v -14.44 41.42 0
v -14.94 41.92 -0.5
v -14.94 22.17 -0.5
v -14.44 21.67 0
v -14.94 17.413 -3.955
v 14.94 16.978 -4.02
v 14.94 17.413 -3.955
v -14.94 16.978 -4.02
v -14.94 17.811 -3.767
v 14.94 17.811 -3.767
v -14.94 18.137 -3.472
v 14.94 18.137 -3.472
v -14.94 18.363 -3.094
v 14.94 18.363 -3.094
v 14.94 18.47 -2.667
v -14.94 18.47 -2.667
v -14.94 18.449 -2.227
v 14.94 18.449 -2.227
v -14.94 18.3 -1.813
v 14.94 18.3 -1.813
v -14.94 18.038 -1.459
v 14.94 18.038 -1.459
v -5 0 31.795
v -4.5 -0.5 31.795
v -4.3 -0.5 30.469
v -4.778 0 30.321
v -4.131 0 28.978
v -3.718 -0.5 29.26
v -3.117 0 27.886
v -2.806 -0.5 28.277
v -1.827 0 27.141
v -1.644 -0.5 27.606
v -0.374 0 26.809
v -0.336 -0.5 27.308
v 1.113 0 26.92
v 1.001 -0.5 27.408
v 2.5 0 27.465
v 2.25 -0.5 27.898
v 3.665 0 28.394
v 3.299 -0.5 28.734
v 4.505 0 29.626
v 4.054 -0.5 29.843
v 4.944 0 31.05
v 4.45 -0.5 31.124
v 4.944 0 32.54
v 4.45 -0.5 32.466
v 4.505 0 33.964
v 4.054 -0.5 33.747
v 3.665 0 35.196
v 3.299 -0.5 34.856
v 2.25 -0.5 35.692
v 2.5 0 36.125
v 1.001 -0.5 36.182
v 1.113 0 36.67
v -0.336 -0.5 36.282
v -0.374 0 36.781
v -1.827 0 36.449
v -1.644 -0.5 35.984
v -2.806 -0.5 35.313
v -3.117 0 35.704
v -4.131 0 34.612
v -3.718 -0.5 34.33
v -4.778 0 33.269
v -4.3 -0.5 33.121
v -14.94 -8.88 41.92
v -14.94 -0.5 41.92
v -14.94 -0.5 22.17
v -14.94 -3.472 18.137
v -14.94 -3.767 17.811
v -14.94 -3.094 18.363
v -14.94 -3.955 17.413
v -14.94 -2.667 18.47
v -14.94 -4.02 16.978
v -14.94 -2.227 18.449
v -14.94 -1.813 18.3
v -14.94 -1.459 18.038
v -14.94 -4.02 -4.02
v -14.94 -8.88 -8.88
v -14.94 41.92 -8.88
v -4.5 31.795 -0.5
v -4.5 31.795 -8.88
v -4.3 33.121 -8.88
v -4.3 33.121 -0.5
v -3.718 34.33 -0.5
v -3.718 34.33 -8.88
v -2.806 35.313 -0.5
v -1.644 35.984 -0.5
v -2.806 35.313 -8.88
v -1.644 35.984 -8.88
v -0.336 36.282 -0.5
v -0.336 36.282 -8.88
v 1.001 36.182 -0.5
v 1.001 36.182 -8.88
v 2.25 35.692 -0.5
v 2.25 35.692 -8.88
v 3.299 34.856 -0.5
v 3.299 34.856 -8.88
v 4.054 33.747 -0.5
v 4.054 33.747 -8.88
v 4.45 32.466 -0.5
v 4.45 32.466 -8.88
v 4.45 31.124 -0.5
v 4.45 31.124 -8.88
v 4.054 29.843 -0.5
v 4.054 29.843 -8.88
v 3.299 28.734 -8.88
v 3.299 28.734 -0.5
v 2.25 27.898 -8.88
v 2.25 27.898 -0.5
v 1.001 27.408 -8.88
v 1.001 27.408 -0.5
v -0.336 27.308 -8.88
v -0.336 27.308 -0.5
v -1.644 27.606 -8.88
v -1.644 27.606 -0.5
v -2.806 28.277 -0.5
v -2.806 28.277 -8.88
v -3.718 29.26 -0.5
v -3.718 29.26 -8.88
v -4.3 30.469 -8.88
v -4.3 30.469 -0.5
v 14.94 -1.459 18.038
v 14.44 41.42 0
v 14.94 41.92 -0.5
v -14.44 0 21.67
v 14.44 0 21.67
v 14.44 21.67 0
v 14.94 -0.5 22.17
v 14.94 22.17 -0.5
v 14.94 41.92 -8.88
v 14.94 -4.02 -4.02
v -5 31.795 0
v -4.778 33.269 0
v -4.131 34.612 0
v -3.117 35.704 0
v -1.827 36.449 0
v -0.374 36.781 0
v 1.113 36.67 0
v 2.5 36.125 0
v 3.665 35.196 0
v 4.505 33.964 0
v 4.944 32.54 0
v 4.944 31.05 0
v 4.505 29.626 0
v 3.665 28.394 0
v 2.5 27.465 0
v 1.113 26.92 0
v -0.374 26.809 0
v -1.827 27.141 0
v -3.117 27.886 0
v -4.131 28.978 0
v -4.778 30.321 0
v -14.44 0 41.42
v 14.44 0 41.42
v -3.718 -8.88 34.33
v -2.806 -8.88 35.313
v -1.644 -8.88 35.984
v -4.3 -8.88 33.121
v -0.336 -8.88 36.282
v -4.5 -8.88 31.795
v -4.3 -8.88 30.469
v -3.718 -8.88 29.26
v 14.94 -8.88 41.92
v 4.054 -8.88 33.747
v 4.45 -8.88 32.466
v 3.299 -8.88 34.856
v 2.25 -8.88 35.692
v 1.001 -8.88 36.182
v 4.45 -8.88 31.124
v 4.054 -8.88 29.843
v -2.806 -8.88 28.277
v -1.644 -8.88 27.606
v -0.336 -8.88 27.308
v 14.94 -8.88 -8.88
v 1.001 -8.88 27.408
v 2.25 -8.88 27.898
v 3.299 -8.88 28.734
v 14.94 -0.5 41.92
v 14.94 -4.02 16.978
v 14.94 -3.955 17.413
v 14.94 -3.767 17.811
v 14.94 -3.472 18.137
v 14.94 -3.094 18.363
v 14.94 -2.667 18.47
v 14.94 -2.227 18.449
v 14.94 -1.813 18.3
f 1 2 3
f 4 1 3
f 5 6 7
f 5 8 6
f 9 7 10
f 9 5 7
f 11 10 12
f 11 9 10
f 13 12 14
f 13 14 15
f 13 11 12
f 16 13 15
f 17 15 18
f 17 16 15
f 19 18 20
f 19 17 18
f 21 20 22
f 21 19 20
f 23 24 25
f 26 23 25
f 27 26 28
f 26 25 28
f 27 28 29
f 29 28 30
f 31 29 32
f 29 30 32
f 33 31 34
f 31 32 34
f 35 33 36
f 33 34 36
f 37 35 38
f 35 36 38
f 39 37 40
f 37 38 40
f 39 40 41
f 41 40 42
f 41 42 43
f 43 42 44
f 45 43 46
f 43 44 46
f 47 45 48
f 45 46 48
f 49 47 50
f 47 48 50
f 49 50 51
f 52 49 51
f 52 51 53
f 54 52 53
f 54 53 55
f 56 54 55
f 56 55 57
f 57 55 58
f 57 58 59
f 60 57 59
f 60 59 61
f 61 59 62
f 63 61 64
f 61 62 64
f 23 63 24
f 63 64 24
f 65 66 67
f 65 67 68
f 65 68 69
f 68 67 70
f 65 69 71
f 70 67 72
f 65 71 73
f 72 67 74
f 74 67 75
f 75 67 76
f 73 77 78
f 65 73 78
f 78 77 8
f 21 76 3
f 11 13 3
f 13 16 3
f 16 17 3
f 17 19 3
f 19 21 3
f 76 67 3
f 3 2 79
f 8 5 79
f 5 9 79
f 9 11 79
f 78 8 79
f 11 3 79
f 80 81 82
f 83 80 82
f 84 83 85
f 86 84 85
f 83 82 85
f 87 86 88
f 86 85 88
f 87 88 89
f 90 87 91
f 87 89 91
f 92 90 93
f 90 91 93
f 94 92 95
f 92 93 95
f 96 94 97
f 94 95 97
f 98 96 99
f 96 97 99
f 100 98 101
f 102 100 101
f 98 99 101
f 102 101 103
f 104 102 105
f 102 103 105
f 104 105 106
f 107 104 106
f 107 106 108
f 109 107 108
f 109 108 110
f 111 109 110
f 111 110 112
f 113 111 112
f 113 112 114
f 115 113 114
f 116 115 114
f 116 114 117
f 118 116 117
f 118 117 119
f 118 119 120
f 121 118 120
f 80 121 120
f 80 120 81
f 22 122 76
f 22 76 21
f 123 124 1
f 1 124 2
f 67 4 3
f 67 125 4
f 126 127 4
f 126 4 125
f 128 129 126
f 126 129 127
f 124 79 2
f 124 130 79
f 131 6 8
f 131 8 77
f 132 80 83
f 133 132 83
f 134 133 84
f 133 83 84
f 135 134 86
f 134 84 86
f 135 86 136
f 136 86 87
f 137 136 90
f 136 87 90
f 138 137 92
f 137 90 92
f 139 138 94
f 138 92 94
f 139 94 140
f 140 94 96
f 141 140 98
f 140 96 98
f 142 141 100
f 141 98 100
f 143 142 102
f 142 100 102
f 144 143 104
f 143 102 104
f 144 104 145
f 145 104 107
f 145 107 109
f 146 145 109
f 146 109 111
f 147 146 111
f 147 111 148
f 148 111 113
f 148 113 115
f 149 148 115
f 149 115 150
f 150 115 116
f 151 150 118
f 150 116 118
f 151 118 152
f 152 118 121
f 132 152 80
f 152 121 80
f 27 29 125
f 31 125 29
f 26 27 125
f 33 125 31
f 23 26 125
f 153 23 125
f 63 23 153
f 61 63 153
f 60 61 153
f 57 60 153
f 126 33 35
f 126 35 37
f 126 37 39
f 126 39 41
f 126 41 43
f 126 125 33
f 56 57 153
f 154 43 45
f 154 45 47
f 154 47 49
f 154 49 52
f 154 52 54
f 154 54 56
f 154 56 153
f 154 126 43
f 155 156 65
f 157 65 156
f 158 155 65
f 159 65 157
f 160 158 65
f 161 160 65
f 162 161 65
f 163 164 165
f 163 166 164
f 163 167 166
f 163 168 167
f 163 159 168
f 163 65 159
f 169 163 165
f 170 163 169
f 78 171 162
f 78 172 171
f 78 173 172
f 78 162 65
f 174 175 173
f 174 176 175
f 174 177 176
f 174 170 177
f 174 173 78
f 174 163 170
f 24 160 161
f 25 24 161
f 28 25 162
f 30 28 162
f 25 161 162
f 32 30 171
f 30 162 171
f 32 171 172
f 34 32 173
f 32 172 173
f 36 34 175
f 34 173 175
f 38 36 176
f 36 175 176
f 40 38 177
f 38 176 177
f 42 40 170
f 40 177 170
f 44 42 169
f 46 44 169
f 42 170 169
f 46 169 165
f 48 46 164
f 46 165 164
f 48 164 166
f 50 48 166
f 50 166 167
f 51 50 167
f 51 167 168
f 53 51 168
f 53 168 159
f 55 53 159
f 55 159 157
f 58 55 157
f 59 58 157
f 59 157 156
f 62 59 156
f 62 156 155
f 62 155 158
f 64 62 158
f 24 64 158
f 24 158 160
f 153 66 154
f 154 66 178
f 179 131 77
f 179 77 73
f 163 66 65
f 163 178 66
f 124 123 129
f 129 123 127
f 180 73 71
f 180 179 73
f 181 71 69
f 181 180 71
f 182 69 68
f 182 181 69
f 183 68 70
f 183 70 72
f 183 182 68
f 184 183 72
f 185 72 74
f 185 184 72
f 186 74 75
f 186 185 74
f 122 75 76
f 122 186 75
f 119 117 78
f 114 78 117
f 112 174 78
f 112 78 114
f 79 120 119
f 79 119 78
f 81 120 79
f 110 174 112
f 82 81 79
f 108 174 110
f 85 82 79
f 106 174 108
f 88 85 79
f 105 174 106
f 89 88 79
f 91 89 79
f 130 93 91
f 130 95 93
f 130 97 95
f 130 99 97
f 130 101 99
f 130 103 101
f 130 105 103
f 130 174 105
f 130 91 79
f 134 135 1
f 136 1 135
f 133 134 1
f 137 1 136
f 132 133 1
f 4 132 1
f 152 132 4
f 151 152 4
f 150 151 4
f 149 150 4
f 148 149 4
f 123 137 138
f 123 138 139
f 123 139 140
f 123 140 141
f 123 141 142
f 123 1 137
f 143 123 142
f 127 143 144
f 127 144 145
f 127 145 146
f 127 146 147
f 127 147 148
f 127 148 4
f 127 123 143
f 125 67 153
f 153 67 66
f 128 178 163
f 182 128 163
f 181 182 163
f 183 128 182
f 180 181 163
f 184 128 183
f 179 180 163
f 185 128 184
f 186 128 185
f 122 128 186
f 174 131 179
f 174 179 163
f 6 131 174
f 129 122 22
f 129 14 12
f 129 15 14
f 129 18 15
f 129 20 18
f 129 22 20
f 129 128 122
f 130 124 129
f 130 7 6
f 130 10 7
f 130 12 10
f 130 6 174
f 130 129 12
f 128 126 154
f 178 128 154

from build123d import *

# Parameters (mm, degrees)
BOSS_EXTRUDE1_DEPTH     = 14.94
CUT_EXTRUDE1_DEPTH      = 15.94
CUT_EXTRUDE1_DEPTH_BACK = 15.94
FILLET1_R               = 1.5
F_1_0MM_DOWEL_HOLE1_D   = 9
F_1_0MM_DOWEL_HOLE2_D   = 9
CHAMFER1_SIZE           = 0.5


with BuildPart() as part:
    # Sketch1 → Boss-Extrude1 (new body, symmetric)
    with BuildSketch(Plane(origin=(0, 0, 0), x_dir=(0, 0, -1), z_dir=(1, 0, 0))):
        Polygon((-21.67, 0), (-41.92, 0), (-41.92, -8.88), (8.88, -8.88), (8.88, 41.92), (0, 41.92), (0, 21.67), align=None)
    extrude(amount=BOSS_EXTRUDE1_DEPTH, both=True)

    # Sketch2 → Cut-Extrude1 (cut, two sides)
    with BuildSketch(Plane(origin=(0, 0, 0), x_dir=(0, 0, -1), z_dir=(1, 0, 0))) as cut_extrude1_sk:
        Polygon((-20.598831175, -4.02), (4.02, 20.598831175), (4.02, -4.02), align=None)
    extrude(amount=CUT_EXTRUDE1_DEPTH, mode=Mode.SUBTRACT)
    extrude(cut_extrude1_sk.sketch, amount=-CUT_EXTRUDE1_DEPTH_BACK, mode=Mode.SUBTRACT)

    # Fillet1
    fillet1_edges = [part.edges().sort_by_distance(p)[0] for p in [
        (0, -4.02, 20.598831175),
        (0, 20.598831175, -4.02),
    ]]
    fillet(fillet1_edges, radius=FILLET1_R)

    # Ø1.0mm Dowel Hole1 (through all)
    with Locations(Plane(origin=(0, 0, 0), x_dir=(1, 0, 0), z_dir=(0, 1, 0))):
        with Locations((0, -31.795)):
            Hole(F_1_0MM_DOWEL_HOLE1_D / 2)

    # Ø1.0mm Dowel Hole2 (through all)
    with Locations(Plane.XY):
        with Locations((0, 31.795)):
            Hole(F_1_0MM_DOWEL_HOLE2_D / 2)

    # Chamfer1
    chamfer1_edges = [part.edges().sort_by_distance(p)[0] for p in [
        (0, 0, 41.92),
        (0, 41.92, 0),
        (14.94, 31.795, 0),
        (14.94, 0, 31.795),
        (4.5, 0, 31.795),
        (4.5, 31.795, 0),
        (-14.94, 0, 31.795),
        (-14.94, 31.795, 0),
    ]]
    chamfer(chamfer1_edges, length=CHAMFER1_SIZE)


solid = part.part
